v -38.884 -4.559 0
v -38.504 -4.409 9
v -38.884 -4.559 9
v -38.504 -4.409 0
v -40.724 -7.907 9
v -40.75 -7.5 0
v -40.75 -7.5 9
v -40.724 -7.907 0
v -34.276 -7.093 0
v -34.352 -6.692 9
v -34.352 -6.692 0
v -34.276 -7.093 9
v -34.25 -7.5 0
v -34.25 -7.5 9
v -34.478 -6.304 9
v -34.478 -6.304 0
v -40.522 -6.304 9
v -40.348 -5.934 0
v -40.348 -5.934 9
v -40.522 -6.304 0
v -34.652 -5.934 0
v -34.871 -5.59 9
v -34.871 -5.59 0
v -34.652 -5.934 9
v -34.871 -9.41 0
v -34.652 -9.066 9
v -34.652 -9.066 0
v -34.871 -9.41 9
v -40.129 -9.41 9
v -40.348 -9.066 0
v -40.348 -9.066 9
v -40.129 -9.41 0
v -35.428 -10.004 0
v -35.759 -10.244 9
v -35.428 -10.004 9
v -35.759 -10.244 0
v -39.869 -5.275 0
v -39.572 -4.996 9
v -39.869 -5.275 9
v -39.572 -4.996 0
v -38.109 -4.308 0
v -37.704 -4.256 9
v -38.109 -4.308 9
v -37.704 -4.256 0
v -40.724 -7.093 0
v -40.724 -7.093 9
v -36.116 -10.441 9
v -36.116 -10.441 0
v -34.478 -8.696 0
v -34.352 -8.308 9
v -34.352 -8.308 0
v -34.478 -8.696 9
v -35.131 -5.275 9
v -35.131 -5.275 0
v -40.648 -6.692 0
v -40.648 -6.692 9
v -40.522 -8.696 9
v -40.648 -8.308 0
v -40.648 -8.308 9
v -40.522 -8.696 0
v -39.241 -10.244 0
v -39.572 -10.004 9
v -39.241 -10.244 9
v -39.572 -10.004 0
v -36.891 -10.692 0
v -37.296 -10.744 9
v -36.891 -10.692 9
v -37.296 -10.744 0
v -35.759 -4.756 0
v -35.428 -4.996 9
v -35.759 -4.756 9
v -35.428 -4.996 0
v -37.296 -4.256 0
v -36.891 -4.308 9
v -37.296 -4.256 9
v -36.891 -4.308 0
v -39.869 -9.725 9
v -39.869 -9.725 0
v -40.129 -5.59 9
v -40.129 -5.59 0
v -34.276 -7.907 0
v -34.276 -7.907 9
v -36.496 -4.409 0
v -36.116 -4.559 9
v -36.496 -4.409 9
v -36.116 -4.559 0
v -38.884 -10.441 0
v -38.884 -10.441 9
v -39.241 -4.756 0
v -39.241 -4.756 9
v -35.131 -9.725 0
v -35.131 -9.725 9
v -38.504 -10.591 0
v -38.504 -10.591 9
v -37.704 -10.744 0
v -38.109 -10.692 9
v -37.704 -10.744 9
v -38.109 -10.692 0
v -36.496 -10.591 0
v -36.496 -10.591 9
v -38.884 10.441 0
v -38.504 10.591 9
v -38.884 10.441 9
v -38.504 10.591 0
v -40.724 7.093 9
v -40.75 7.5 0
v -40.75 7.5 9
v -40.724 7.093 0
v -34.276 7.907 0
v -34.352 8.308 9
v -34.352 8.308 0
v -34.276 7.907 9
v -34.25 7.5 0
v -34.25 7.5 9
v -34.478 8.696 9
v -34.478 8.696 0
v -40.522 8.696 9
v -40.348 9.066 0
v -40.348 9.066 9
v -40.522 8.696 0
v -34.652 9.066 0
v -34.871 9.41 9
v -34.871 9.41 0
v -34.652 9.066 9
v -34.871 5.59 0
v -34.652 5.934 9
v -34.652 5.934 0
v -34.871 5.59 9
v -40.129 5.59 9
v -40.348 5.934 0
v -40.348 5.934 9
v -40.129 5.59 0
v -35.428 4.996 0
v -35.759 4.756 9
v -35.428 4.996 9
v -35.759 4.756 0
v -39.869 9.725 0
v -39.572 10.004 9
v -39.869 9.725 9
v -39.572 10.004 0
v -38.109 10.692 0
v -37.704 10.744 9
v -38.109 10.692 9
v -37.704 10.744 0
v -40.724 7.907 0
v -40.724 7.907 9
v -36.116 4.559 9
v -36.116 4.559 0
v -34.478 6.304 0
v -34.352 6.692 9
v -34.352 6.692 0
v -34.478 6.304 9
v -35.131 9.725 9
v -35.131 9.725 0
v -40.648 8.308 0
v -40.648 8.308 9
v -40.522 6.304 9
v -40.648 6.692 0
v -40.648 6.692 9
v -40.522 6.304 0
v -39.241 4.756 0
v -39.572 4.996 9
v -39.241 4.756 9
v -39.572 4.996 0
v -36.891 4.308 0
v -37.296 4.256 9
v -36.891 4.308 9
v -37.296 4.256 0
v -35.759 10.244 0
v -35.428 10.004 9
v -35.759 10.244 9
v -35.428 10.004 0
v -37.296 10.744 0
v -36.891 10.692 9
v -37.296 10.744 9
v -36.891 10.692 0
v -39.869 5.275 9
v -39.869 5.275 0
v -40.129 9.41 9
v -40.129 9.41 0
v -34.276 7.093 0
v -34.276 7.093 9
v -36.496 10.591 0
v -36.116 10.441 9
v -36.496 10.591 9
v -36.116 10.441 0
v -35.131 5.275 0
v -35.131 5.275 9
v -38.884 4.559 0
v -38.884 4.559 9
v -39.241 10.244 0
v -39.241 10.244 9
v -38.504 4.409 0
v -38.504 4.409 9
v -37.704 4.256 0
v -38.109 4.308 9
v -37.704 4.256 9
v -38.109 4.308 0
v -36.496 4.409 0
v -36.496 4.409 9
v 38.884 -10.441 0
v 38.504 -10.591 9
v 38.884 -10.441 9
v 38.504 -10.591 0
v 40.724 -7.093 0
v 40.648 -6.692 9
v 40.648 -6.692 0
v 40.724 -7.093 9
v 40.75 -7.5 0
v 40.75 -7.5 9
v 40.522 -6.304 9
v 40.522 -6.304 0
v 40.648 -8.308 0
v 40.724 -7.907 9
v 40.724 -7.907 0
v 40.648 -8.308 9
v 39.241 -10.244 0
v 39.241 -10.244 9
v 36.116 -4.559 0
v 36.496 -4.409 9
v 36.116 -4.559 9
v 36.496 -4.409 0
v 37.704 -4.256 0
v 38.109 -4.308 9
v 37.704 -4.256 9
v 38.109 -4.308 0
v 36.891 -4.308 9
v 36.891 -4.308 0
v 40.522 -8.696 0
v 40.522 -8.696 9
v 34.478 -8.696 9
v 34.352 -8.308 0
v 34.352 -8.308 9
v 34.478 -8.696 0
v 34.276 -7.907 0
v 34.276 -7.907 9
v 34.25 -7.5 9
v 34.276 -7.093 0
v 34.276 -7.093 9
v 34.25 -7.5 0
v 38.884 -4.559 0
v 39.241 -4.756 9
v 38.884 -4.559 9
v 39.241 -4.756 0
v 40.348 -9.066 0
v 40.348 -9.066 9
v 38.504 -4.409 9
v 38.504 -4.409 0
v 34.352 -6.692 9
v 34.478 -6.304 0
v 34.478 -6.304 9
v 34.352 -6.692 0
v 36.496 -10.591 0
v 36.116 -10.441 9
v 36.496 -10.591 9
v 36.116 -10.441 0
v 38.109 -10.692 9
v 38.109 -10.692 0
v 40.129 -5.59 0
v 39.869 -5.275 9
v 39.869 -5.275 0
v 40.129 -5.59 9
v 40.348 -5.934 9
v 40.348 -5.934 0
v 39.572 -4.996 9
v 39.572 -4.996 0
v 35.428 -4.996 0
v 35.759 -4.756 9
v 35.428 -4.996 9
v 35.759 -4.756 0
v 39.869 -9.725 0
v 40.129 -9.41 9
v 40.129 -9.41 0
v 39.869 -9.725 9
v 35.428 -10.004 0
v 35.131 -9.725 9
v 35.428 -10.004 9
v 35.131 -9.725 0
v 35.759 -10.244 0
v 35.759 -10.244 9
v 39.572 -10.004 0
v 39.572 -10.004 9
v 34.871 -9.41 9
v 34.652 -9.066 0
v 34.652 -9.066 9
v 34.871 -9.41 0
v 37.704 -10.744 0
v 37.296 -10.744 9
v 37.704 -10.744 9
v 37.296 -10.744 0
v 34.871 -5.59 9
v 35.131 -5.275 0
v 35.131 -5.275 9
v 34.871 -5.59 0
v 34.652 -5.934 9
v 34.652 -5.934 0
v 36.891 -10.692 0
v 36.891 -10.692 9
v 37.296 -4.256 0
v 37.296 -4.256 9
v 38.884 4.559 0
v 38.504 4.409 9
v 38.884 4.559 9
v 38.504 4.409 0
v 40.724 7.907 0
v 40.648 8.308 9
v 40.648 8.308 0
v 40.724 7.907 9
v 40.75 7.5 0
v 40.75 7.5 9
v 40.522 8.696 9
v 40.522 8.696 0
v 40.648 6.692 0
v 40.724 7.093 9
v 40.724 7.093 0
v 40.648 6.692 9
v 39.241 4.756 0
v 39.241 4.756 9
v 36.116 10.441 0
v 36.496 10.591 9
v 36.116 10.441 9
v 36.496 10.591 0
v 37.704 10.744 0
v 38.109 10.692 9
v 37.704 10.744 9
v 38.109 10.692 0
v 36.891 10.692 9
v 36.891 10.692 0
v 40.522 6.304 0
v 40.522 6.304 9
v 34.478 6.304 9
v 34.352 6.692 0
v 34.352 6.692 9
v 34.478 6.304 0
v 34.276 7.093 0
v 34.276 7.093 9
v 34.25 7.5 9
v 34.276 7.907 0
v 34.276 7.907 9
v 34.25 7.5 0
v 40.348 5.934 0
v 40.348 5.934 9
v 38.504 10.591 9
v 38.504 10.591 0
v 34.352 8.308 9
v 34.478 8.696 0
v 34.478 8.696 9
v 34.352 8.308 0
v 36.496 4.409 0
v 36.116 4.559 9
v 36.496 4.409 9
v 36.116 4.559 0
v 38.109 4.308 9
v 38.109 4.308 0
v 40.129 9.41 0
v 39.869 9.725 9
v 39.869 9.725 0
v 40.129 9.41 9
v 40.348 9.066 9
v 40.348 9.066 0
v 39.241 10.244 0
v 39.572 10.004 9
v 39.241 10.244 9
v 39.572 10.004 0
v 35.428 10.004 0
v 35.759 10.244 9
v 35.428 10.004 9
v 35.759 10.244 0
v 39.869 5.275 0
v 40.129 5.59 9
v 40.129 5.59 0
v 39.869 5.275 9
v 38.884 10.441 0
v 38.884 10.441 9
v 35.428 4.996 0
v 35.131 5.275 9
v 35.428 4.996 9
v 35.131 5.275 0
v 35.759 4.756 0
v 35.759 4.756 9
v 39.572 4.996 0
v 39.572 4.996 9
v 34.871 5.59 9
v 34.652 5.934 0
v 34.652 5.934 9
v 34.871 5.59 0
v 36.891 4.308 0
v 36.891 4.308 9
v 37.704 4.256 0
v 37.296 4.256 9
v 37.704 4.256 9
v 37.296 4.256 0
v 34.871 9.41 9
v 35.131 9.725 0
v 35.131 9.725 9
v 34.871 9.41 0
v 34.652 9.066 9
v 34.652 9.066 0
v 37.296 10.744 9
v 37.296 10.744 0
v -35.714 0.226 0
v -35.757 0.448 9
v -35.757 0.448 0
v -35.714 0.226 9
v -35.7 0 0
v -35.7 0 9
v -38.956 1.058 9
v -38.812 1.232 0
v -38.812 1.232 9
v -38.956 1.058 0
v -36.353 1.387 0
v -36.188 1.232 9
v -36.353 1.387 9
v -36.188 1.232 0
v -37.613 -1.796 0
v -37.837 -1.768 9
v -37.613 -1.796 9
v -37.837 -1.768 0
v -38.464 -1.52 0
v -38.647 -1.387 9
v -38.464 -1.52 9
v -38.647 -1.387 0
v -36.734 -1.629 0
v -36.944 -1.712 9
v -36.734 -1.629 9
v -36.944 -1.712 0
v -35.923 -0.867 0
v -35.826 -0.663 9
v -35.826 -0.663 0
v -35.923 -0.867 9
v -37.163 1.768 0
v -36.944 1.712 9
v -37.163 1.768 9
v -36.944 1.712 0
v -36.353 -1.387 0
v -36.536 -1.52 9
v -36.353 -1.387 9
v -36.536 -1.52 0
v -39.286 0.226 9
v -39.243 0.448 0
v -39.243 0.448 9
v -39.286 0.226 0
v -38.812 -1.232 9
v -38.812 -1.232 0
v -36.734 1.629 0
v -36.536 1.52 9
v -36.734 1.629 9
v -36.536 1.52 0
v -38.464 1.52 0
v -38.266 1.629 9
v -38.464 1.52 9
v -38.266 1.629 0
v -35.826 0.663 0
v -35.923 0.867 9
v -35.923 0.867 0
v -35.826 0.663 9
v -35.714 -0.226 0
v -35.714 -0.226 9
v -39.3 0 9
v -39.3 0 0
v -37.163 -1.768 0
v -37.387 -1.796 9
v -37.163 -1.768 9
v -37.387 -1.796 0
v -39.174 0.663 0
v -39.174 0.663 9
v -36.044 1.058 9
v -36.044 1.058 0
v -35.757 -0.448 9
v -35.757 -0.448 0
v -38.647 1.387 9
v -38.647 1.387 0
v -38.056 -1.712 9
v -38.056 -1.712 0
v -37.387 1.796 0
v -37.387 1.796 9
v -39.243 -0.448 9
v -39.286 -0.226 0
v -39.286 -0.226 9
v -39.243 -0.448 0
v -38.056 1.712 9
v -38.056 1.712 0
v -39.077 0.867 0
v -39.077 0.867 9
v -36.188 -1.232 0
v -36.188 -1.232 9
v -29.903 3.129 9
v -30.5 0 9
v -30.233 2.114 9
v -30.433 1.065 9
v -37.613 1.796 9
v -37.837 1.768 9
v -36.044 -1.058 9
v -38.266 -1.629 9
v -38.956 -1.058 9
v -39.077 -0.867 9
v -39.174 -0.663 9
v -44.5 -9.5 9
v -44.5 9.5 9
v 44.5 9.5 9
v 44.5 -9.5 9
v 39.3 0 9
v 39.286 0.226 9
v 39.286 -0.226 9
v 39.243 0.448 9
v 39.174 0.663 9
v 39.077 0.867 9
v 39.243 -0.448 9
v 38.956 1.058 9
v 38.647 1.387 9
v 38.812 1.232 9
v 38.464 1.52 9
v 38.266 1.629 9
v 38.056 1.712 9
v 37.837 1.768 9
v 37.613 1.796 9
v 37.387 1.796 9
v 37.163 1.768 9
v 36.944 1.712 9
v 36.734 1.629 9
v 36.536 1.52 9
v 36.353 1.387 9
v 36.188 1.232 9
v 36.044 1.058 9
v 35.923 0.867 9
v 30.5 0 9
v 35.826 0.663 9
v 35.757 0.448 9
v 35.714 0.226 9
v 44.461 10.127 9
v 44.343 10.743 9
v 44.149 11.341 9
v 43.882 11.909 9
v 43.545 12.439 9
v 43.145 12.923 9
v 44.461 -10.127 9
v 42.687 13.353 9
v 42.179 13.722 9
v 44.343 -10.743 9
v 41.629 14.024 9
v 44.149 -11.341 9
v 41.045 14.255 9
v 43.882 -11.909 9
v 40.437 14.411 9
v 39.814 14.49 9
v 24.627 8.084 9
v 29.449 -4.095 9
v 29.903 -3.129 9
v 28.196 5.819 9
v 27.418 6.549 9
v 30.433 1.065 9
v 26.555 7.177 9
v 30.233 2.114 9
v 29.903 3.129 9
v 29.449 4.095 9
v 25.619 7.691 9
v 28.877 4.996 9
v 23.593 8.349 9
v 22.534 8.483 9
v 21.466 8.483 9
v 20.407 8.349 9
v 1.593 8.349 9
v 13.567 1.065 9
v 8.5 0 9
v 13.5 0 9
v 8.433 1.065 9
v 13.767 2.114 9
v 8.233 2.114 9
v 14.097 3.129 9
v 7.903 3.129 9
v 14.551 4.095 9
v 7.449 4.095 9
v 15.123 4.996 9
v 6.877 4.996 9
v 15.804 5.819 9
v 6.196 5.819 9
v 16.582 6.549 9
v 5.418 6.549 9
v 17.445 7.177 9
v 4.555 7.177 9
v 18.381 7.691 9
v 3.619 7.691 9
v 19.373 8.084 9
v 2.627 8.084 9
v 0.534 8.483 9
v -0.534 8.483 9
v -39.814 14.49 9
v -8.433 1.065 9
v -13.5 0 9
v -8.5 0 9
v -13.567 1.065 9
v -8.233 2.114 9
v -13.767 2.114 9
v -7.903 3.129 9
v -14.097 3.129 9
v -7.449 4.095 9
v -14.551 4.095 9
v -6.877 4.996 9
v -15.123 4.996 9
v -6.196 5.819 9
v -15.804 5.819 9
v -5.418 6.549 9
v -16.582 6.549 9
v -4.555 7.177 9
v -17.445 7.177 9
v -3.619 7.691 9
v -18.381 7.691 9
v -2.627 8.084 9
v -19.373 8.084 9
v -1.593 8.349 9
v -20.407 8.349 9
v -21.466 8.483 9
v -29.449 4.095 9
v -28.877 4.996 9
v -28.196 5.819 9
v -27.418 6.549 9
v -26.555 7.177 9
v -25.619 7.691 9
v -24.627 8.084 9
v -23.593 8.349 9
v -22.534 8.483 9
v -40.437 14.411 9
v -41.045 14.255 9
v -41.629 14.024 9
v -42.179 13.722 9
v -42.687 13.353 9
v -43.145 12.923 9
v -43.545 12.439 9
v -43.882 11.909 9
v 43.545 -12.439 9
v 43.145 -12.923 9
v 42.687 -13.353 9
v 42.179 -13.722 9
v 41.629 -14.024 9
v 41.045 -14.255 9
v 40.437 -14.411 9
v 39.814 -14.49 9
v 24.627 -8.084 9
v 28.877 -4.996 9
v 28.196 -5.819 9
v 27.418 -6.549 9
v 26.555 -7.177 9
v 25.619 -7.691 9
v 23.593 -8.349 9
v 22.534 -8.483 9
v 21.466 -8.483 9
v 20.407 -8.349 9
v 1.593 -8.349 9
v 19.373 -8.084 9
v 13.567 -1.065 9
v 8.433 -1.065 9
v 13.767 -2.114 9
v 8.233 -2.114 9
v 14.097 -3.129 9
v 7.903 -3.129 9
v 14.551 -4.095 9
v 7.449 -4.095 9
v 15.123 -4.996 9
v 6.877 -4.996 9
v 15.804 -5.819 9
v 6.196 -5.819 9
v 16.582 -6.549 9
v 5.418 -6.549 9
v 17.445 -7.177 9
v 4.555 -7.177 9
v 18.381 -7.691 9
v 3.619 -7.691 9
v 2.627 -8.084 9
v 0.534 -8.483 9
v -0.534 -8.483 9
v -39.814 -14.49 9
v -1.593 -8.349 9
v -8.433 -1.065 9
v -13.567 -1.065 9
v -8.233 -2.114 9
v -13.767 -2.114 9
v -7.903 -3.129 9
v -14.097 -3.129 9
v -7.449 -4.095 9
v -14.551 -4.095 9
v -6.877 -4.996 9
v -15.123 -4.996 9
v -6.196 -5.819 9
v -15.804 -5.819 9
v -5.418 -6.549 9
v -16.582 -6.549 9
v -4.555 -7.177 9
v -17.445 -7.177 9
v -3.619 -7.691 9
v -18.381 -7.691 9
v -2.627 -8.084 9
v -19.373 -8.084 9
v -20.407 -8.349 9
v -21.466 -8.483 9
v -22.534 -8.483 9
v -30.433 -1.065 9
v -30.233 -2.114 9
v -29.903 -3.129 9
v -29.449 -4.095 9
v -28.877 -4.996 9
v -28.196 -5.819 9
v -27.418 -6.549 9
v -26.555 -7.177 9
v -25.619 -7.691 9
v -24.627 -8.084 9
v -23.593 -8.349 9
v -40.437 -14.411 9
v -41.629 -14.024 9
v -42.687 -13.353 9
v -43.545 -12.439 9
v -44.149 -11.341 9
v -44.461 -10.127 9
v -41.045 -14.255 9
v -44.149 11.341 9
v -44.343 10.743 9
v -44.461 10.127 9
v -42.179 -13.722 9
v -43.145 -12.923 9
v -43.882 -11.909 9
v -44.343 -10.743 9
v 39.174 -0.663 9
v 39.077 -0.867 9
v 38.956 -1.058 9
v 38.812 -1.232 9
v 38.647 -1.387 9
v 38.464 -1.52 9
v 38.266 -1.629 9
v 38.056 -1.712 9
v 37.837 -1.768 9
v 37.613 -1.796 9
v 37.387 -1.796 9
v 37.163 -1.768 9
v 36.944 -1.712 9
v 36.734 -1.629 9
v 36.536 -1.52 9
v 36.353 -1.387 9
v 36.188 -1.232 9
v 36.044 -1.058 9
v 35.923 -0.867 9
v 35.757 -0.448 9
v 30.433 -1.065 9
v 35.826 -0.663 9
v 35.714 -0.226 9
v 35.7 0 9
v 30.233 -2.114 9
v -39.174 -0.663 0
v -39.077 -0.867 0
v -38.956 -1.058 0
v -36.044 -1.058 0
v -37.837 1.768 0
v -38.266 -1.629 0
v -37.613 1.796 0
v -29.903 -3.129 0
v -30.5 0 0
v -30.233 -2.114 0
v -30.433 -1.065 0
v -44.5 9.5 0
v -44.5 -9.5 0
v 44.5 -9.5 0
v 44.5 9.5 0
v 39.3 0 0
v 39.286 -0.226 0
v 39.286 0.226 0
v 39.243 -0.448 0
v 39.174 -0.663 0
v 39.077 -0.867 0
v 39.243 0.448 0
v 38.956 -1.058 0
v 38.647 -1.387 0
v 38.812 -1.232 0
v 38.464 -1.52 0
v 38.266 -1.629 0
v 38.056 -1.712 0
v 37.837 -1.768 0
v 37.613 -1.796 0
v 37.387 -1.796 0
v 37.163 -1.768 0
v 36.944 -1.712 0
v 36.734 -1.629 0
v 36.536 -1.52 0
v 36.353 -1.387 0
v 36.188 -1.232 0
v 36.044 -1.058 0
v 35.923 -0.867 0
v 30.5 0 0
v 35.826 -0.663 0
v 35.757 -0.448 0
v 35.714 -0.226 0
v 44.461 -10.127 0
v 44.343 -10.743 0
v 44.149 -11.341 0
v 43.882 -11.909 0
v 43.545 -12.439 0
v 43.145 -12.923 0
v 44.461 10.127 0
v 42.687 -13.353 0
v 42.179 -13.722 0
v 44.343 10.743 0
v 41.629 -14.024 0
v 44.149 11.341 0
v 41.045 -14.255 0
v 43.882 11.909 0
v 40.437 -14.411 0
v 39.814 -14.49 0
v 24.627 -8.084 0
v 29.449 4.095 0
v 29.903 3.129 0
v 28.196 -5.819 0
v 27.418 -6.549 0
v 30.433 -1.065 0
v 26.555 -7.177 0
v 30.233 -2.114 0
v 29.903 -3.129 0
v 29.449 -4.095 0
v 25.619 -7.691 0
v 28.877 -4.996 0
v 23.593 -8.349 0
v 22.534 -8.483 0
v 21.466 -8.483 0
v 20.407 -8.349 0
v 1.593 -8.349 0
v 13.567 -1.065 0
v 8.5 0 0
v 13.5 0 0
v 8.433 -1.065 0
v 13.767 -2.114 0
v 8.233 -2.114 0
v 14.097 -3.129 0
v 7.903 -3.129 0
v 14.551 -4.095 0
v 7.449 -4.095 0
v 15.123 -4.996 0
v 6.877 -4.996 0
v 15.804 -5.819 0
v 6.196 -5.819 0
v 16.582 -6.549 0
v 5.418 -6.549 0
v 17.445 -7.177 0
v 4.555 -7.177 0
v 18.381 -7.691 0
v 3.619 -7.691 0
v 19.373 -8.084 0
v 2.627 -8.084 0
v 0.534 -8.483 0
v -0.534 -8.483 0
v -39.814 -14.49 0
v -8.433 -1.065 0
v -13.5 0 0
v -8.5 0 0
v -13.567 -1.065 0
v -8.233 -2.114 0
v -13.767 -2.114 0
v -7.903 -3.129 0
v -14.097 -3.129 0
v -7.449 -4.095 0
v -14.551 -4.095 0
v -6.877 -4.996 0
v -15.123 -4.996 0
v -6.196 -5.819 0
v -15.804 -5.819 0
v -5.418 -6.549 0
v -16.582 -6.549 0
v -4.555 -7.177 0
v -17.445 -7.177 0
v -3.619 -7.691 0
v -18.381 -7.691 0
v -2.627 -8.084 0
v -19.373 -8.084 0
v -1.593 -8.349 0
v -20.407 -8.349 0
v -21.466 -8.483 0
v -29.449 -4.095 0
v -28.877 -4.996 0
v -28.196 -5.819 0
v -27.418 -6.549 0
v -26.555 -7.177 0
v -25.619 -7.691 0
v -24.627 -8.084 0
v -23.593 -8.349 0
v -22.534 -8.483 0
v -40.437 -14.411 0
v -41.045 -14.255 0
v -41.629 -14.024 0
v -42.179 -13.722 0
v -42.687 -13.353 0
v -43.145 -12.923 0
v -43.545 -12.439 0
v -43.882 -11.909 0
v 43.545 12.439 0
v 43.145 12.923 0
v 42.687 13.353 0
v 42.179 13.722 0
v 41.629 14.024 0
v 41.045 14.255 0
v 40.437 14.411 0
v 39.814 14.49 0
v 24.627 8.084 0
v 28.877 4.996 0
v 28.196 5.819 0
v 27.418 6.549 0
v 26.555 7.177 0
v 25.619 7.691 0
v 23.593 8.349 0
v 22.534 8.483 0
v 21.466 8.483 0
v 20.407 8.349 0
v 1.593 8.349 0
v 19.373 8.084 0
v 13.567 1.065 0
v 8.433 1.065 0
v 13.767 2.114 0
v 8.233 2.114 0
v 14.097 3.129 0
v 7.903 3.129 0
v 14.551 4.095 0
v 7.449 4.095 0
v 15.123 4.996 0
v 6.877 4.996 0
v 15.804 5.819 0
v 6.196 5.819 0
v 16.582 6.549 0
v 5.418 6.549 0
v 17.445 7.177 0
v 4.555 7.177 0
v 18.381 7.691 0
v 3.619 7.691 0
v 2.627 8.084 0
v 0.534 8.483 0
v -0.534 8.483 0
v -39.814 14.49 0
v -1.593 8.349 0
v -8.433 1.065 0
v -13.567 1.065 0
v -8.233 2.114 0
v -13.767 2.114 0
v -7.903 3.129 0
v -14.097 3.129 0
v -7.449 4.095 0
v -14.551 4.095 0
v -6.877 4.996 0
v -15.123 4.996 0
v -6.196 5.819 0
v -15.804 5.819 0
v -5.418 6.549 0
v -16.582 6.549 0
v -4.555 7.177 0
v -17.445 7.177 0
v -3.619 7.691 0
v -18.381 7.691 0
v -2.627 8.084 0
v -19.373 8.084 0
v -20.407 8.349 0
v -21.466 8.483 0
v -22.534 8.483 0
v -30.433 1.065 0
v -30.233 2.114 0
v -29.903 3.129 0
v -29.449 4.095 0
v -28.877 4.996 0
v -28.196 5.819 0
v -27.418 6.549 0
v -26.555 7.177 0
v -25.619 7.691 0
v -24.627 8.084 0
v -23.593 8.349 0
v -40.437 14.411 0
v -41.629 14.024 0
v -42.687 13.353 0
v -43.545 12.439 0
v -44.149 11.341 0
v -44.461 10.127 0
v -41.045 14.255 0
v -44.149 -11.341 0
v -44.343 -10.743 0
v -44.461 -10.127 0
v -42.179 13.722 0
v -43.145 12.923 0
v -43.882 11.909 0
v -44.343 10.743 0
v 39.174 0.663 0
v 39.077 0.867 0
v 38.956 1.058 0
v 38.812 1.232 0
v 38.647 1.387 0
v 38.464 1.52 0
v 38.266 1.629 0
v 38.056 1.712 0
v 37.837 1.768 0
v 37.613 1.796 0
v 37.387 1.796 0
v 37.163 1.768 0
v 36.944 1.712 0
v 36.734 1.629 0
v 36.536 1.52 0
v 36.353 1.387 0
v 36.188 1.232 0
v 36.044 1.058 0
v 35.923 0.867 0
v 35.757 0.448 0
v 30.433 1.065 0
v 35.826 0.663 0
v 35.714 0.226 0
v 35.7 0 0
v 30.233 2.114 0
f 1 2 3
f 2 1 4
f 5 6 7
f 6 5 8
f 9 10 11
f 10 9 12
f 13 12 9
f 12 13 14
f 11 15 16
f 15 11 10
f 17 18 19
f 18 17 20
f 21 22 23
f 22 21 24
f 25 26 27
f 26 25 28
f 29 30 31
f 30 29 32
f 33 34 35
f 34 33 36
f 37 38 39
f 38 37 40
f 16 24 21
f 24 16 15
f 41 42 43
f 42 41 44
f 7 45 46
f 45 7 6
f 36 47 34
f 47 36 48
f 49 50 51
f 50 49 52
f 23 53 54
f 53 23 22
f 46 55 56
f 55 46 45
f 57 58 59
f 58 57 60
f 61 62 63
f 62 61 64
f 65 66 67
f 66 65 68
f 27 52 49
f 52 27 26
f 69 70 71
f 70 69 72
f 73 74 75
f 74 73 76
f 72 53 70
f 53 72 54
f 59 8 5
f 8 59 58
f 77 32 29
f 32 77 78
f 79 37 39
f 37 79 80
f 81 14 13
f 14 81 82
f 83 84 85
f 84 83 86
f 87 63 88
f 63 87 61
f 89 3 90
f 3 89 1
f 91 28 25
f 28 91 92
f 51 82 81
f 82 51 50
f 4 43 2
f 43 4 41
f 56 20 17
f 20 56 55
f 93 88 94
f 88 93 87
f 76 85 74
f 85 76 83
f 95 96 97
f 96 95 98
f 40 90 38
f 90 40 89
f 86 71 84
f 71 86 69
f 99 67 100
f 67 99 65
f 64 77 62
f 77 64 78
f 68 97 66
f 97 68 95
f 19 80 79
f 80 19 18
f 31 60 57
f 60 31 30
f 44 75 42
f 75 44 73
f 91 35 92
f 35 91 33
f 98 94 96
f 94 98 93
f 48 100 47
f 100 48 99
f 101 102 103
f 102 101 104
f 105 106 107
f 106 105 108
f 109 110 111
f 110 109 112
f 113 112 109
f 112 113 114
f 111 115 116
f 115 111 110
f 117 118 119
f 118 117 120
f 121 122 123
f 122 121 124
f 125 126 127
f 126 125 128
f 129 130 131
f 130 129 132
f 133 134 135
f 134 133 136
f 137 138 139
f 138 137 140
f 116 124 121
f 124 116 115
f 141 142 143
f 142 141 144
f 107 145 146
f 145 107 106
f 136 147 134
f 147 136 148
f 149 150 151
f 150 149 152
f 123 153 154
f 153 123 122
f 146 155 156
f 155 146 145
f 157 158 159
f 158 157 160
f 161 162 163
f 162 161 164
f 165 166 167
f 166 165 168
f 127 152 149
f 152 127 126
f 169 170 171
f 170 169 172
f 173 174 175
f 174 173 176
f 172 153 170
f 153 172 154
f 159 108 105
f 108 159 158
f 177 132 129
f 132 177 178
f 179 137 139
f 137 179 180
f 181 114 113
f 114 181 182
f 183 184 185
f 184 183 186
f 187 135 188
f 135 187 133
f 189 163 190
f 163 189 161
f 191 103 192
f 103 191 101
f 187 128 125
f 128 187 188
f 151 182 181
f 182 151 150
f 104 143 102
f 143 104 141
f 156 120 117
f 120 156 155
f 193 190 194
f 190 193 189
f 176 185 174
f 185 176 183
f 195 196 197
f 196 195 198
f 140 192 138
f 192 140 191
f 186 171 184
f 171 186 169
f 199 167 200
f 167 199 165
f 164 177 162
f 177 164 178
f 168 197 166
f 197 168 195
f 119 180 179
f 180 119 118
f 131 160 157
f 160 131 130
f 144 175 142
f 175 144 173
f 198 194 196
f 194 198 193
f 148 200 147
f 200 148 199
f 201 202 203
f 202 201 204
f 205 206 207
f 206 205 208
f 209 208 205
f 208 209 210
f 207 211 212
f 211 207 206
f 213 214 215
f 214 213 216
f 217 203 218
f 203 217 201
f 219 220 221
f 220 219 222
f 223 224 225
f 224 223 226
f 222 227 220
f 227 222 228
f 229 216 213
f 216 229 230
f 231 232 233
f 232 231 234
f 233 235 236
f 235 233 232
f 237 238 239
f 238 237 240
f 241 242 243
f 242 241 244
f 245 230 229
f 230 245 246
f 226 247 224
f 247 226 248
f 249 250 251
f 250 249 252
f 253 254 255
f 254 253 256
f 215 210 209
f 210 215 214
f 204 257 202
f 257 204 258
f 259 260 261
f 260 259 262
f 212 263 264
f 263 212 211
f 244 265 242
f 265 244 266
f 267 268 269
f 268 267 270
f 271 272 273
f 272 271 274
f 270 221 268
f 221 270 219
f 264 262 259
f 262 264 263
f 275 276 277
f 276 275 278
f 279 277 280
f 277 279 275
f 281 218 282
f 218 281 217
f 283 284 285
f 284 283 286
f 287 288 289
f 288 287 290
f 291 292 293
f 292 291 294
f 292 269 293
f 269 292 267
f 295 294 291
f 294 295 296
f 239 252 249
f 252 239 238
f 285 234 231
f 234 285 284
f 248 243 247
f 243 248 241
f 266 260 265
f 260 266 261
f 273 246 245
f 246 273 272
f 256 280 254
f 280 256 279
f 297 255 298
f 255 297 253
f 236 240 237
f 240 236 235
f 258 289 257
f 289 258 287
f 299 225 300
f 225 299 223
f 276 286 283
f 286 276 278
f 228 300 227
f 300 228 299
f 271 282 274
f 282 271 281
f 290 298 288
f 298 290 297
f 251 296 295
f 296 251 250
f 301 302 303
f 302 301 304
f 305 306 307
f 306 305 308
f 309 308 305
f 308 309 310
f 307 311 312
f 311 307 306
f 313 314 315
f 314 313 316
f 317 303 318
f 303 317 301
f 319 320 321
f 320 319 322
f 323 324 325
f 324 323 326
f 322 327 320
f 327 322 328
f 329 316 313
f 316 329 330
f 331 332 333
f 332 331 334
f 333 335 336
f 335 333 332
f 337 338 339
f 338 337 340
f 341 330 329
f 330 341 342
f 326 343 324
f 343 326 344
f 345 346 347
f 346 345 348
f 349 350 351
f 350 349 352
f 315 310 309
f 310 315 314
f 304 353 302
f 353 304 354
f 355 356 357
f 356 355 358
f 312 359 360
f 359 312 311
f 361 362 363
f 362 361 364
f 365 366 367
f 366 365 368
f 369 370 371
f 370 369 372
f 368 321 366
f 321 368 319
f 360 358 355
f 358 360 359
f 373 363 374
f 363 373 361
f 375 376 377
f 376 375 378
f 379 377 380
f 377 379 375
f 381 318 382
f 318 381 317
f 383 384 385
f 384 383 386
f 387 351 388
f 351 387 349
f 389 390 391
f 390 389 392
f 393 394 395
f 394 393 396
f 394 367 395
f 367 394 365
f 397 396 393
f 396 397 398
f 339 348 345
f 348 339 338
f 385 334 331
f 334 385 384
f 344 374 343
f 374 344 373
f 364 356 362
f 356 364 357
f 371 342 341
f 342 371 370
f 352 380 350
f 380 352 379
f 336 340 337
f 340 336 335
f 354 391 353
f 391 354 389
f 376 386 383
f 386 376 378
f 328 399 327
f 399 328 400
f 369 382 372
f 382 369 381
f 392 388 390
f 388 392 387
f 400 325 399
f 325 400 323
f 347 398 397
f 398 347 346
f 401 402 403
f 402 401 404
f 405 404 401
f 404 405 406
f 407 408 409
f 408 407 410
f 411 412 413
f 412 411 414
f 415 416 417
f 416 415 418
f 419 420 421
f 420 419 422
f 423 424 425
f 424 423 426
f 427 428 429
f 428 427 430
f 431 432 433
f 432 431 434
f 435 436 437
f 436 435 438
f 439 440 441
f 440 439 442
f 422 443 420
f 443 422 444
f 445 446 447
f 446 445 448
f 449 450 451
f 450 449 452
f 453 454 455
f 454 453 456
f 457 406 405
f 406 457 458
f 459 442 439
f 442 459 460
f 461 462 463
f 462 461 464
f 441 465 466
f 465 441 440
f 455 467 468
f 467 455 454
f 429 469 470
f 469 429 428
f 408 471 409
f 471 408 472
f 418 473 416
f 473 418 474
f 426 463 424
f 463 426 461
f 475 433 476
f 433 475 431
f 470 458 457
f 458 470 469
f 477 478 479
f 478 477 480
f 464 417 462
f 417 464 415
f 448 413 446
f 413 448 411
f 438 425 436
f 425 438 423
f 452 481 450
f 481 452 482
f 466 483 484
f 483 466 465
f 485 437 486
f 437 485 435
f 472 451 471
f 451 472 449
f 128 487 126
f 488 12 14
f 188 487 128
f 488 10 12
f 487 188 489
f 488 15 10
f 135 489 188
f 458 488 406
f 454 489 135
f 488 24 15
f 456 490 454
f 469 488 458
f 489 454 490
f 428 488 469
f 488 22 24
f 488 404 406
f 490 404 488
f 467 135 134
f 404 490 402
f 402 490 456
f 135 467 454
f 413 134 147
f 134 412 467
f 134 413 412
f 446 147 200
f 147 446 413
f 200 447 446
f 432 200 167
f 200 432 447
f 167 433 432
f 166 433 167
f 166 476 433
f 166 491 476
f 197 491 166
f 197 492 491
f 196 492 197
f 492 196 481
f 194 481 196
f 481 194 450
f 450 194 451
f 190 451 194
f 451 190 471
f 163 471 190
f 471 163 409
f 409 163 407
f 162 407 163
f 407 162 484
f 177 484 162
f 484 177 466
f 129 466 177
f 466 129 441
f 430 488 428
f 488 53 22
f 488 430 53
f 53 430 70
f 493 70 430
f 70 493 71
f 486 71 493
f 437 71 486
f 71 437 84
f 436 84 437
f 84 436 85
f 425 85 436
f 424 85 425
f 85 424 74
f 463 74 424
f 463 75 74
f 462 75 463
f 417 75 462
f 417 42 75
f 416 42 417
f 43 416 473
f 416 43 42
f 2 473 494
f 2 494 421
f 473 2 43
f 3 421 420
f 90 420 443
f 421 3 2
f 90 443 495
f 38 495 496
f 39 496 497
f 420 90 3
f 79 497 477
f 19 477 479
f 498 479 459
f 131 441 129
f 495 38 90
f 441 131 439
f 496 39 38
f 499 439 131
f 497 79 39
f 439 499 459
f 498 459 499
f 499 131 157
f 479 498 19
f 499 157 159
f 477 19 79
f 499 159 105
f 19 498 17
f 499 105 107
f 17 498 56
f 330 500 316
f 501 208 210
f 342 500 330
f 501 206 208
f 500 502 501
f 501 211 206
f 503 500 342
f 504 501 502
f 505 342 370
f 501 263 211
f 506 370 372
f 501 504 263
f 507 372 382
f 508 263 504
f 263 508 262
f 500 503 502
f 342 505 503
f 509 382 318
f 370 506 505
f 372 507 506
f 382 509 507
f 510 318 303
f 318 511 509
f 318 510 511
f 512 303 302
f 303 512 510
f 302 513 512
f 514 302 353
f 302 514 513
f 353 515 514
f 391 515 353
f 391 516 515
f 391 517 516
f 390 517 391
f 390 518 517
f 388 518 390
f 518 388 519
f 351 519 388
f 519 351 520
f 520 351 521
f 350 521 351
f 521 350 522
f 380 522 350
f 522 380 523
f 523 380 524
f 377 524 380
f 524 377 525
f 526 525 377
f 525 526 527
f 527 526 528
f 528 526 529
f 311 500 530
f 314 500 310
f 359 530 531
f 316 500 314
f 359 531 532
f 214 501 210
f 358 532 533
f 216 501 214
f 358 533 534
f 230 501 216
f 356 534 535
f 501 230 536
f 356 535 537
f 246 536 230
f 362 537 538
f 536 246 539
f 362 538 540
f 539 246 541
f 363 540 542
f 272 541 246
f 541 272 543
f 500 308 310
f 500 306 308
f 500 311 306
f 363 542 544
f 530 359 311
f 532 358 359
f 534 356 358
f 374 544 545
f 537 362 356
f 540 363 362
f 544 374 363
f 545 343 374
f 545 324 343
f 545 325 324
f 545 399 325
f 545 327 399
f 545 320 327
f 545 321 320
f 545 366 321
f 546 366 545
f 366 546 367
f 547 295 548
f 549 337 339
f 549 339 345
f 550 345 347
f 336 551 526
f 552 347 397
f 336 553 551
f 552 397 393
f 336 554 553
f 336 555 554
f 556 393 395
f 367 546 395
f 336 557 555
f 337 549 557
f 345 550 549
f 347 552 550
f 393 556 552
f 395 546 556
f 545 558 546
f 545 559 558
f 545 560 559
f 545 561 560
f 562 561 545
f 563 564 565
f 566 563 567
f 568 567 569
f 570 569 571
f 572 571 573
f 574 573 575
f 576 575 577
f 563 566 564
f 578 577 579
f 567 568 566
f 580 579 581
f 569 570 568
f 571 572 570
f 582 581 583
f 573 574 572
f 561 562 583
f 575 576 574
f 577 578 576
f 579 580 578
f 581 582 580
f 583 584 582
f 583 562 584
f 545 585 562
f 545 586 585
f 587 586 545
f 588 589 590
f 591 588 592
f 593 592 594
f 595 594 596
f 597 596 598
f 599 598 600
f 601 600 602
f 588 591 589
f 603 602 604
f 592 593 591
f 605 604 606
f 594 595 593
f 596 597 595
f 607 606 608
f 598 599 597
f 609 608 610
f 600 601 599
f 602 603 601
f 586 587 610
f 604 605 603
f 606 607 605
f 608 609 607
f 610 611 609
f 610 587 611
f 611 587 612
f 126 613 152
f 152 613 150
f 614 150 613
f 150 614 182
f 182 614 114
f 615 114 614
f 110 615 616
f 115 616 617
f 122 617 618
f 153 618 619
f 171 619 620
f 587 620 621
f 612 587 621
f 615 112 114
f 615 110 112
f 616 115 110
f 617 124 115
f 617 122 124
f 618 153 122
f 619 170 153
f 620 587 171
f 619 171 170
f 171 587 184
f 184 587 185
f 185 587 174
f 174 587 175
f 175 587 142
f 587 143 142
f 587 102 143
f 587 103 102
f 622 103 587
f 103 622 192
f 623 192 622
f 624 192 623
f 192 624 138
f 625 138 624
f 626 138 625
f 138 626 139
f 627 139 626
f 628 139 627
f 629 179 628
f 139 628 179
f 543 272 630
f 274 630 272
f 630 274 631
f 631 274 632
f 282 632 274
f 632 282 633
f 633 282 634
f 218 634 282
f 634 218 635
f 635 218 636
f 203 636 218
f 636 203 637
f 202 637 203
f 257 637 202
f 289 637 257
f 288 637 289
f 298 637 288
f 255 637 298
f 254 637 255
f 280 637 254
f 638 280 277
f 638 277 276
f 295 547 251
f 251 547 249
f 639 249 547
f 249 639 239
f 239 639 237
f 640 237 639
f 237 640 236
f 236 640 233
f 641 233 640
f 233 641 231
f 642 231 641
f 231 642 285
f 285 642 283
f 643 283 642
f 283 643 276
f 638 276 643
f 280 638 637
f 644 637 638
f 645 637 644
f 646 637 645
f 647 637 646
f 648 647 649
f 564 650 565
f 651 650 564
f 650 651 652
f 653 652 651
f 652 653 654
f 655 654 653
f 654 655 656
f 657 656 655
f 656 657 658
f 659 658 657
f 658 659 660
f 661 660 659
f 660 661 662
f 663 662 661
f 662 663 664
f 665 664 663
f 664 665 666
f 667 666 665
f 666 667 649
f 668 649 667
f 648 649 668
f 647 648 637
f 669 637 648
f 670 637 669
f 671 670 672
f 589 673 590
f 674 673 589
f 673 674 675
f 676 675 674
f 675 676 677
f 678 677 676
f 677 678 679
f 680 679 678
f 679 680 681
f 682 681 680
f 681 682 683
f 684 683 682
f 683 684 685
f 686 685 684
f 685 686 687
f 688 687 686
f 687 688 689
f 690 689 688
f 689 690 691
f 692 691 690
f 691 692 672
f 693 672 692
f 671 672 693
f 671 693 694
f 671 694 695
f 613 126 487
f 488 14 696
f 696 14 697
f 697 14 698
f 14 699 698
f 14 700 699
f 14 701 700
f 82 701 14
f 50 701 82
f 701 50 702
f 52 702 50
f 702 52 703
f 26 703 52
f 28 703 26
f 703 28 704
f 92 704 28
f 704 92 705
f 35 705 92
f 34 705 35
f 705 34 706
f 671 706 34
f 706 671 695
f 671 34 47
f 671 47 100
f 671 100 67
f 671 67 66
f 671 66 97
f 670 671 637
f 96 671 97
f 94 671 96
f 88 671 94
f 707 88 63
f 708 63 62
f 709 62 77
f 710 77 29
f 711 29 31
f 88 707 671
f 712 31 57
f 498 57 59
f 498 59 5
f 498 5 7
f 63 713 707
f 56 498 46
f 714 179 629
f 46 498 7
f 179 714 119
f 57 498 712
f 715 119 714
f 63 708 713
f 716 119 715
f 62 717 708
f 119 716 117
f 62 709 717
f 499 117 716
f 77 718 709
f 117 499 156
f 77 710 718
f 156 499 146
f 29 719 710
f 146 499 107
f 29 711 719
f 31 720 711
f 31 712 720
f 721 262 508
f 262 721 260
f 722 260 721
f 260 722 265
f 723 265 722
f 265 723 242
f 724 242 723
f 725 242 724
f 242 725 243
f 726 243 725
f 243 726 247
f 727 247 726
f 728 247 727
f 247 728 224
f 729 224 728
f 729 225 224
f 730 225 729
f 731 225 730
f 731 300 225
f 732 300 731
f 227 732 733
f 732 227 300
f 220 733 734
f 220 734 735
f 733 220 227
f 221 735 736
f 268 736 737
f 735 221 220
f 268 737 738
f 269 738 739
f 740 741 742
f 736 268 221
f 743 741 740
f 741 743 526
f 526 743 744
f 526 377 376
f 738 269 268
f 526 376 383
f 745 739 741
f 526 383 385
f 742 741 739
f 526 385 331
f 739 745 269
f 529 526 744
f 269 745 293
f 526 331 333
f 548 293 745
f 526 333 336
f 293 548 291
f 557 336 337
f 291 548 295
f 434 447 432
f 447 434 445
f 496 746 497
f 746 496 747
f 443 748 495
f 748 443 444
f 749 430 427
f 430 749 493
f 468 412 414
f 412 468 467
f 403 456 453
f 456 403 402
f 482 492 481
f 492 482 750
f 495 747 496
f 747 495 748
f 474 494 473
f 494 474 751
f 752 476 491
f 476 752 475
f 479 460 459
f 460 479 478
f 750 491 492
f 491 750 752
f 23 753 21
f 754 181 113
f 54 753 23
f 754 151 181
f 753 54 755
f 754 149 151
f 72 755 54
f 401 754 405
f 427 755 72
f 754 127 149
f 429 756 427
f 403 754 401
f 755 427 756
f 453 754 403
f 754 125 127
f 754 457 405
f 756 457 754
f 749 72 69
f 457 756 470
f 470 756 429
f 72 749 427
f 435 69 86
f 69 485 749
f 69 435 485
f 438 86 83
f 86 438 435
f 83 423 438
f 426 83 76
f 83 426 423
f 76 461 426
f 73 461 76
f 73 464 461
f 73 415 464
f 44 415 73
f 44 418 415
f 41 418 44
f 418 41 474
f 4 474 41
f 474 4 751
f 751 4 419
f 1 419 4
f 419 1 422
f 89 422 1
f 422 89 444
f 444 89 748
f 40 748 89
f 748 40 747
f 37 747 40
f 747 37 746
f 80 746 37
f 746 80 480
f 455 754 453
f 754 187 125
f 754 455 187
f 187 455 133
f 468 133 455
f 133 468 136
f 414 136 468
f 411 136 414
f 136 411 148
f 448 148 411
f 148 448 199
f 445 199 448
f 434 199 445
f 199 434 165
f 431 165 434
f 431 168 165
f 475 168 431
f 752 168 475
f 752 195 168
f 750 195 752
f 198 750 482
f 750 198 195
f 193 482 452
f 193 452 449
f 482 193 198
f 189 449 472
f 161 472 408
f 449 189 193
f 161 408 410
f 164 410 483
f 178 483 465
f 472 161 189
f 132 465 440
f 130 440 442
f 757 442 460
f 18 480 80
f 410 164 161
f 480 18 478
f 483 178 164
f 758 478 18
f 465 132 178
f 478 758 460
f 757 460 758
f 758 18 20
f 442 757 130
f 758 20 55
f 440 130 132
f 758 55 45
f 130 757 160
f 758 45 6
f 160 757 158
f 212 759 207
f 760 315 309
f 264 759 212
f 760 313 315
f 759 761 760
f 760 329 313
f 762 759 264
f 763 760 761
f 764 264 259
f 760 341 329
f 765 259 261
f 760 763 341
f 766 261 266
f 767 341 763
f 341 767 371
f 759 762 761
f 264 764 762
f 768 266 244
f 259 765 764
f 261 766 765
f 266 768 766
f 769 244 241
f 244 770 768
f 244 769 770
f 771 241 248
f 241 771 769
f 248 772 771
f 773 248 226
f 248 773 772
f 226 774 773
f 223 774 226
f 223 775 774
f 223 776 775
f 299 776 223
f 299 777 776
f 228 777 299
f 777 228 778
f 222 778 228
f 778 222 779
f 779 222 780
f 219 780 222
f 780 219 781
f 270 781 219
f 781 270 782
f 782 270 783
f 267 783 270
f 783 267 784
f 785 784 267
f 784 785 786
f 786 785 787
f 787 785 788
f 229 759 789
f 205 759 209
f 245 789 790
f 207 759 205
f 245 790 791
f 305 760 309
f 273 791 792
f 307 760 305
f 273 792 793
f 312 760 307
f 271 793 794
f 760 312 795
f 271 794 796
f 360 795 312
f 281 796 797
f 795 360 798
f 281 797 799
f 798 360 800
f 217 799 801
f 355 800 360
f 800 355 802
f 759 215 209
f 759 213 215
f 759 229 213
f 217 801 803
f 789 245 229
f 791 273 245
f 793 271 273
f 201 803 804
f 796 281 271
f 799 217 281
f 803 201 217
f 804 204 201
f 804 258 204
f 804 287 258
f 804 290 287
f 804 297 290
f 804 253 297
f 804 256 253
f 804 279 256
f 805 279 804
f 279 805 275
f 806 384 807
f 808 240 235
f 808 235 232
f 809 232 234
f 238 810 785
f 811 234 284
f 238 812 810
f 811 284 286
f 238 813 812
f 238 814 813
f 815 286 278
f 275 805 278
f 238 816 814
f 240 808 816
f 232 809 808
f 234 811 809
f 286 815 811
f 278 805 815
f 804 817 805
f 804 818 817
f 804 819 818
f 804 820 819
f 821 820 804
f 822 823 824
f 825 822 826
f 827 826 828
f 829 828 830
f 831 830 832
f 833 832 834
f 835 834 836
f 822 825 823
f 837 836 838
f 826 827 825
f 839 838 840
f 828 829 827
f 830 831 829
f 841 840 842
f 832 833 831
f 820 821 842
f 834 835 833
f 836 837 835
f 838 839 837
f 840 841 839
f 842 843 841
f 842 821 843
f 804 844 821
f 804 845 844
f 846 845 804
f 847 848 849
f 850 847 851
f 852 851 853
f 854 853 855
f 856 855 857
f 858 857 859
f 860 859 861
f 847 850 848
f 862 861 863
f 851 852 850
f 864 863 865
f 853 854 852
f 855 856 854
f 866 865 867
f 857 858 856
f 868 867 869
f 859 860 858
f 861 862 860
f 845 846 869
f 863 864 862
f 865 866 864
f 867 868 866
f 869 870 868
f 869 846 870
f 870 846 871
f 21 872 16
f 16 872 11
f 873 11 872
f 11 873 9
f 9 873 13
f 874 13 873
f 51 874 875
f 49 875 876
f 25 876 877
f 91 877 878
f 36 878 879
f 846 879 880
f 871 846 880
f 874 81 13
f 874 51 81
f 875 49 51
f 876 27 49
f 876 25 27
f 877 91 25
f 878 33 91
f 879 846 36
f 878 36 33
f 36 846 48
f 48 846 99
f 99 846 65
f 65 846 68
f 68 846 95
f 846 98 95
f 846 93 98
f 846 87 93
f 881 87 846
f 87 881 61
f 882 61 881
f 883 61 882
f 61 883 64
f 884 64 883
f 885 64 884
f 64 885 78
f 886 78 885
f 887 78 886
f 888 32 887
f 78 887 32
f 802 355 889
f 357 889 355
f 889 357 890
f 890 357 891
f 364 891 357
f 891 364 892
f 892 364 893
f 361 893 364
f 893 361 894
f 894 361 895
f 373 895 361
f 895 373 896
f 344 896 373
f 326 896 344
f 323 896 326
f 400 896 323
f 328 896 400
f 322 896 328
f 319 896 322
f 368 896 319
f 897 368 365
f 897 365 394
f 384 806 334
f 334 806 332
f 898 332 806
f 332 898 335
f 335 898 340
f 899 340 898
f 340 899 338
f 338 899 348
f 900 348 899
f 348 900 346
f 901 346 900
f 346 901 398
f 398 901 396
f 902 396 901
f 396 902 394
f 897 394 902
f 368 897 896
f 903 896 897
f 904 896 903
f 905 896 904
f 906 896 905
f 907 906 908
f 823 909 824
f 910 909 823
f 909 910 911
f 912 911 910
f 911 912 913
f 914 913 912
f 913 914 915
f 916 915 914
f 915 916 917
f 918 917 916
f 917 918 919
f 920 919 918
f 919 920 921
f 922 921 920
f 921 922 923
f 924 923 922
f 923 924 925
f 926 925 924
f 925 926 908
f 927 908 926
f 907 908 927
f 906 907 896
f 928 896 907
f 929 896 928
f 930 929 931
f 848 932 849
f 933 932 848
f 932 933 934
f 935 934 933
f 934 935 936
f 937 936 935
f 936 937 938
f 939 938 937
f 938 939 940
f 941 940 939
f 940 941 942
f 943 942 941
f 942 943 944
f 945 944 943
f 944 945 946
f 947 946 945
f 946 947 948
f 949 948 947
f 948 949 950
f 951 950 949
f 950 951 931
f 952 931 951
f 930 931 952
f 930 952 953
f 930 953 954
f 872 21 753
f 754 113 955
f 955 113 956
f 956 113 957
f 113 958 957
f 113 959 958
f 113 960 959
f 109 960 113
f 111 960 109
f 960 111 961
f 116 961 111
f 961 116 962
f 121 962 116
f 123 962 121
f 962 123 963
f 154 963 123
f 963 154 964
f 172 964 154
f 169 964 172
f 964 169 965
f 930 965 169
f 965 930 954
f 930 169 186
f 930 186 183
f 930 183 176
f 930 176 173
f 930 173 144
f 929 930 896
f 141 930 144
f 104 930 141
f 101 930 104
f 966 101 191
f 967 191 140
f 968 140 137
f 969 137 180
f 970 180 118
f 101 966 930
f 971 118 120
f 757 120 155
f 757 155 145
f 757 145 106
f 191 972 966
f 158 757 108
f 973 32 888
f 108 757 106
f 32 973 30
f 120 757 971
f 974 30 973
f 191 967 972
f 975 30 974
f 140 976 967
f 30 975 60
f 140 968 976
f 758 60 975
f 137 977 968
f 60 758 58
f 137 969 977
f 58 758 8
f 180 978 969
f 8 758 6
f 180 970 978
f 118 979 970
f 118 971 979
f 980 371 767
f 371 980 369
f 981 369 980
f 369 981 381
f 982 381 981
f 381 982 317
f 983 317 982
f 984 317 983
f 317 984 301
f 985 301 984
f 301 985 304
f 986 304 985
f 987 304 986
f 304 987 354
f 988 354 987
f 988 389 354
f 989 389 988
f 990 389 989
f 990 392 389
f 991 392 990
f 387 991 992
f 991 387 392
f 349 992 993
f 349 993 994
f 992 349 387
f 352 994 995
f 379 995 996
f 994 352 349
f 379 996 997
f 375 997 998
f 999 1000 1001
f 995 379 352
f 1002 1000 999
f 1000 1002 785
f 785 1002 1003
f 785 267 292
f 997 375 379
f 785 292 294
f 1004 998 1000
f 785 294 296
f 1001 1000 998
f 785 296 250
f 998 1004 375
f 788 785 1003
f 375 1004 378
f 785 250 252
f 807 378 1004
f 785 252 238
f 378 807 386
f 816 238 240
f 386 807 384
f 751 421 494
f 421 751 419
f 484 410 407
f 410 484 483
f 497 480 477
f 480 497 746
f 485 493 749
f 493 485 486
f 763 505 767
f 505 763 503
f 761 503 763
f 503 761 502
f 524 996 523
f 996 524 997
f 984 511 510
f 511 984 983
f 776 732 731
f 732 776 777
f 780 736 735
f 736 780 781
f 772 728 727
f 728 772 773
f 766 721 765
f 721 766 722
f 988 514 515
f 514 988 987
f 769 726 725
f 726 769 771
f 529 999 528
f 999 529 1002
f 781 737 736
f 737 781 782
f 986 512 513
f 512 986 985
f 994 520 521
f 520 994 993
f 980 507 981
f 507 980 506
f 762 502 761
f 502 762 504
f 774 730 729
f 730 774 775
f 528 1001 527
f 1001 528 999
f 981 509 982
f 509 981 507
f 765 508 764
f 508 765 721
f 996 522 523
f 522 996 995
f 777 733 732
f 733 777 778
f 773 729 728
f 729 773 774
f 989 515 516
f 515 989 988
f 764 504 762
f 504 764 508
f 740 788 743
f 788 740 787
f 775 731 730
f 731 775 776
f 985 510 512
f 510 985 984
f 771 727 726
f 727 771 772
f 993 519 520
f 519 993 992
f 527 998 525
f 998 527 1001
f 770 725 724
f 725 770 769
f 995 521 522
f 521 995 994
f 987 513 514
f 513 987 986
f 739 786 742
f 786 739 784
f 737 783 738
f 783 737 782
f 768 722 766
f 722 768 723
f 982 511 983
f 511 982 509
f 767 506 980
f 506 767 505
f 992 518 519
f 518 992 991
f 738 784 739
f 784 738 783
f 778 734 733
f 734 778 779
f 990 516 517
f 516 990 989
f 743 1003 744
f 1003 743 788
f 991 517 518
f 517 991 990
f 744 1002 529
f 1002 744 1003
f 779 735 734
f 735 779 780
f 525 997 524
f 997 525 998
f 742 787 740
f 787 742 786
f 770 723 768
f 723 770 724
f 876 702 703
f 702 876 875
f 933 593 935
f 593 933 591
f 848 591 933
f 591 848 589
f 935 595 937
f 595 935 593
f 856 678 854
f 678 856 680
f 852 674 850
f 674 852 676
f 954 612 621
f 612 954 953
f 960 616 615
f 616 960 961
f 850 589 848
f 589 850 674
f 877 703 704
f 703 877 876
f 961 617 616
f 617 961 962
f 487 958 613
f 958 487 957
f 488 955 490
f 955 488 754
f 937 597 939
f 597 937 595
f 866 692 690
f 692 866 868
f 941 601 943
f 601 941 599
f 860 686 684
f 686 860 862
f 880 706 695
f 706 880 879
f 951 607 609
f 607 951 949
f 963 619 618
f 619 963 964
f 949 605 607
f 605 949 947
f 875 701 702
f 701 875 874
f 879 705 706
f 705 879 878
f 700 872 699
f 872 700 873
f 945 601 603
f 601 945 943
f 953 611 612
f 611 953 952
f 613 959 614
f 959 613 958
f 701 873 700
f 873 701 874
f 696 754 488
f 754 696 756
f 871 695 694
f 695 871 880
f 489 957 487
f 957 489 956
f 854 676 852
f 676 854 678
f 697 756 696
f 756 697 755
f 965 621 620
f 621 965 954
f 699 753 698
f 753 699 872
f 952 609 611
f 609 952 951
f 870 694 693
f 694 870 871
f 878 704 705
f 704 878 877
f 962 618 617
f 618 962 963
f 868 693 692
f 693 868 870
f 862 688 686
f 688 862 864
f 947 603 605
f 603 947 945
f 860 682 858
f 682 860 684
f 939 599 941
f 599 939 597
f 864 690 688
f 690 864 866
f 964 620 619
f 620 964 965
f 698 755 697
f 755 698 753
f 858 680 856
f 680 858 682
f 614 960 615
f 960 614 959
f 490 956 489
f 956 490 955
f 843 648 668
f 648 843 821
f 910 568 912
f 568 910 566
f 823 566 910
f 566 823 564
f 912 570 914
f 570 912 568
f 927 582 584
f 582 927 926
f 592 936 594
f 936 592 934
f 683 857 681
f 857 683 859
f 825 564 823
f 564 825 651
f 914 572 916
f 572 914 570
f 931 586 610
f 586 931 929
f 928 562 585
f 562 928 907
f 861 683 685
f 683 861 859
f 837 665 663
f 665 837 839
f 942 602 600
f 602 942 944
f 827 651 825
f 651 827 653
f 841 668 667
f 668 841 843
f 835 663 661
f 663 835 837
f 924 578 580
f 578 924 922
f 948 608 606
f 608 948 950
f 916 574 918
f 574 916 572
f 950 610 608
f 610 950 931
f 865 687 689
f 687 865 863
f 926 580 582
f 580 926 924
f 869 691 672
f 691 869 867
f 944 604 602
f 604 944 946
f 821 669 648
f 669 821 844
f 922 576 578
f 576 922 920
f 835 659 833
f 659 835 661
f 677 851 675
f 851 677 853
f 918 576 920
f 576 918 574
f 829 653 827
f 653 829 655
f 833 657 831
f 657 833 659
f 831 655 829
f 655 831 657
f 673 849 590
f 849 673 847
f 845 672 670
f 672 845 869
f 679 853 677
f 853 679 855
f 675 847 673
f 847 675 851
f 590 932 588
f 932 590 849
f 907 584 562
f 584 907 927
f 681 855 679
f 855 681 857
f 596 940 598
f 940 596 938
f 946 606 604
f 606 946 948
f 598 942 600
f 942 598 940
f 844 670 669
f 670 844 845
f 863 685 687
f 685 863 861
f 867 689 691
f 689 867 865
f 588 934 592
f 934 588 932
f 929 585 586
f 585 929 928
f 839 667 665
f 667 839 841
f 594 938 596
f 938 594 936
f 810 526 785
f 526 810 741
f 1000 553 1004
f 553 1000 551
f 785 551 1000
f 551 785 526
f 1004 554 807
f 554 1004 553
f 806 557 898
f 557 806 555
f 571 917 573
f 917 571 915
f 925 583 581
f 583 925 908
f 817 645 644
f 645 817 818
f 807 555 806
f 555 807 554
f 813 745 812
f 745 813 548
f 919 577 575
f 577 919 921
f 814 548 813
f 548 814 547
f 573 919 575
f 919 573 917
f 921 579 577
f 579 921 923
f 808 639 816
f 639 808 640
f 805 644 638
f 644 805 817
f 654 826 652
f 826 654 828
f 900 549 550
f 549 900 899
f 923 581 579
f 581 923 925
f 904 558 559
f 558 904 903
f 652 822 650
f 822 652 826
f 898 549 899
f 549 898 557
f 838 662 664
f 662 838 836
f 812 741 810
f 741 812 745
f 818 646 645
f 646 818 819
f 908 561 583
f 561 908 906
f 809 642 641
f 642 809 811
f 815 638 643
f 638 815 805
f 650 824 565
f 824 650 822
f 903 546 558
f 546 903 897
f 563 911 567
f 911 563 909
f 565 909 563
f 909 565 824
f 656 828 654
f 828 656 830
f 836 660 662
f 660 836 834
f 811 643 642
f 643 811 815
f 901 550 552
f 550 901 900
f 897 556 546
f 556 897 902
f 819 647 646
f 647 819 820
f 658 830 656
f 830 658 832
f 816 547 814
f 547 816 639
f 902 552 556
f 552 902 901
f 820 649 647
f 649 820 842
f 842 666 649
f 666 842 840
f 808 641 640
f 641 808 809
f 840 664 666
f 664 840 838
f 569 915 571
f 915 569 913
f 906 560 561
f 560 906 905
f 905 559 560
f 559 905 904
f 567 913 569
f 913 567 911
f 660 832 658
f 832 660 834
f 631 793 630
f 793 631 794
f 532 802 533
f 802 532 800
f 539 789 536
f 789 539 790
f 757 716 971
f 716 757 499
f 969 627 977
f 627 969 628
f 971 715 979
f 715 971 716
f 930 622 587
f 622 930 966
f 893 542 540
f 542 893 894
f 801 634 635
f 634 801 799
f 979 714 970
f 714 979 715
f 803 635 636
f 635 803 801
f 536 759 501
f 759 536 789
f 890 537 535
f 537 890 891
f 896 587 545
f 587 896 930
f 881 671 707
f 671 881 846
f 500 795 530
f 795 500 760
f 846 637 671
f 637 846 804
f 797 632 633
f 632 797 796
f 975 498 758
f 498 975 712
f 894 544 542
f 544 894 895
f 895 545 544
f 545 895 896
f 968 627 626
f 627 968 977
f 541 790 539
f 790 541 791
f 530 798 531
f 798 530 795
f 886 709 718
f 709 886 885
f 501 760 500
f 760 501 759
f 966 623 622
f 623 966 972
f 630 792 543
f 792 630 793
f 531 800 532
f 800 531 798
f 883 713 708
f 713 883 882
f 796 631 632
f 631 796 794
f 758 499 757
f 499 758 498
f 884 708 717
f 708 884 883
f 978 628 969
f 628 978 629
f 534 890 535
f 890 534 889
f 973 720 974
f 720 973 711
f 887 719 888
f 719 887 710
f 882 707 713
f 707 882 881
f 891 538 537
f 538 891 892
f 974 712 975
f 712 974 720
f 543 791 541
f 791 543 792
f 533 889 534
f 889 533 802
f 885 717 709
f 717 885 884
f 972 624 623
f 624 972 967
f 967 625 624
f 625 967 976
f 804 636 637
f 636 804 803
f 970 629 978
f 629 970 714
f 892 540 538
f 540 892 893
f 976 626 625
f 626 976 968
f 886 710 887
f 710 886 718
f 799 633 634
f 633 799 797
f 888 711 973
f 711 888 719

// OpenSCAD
$fn = 50;


difference() {
	union() {
		hull() {
			translate(v = [-39.5000000000, 9.5000000000, 0]) {
				cylinder(h = 9, r = 5);
			}
			translate(v = [39.5000000000, 9.5000000000, 0]) {
				cylinder(h = 9, r = 5);
			}
			translate(v = [-39.5000000000, -9.5000000000, 0]) {
				cylinder(h = 9, r = 5);
			}
			translate(v = [39.5000000000, -9.5000000000, 0]) {
				cylinder(h = 9, r = 5);
			}
		}
	}
	union() {
		#translate(v = [-37.5000000000, -7.5000000000, 0]) {
			cylinder(h = 9, r = 3.2500000000);
		}
		#translate(v = [-37.5000000000, 7.5000000000, 0]) {
			cylinder(h = 9, r = 3.2500000000);
		}
		#translate(v = [37.5000000000, -7.5000000000, 0]) {
			cylinder(h = 9, r = 3.2500000000);
		}
		#translate(v = [37.5000000000, 7.5000000000, 0]) {
			cylinder(h = 9, r = 3.2500000000);
		}
		#translate(v = [-37.5000000000, -7.5000000000, -100.0000000000]) {
			cylinder(h = 200, r = 3.2500000000);
		}
		#translate(v = [-37.5000000000, 7.5000000000, -100.0000000000]) {
			cylinder(h = 200, r = 3.2500000000);
		}
		#translate(v = [37.5000000000, -7.5000000000, -100.0000000000]) {
			cylinder(h = 200, r = 3.2500000000);
		}
		#translate(v = [37.5000000000, 7.5000000000, -100.0000000000]) {
			cylinder(h = 200, r = 3.2500000000);
		}
		#translate(v = [-37.5000000000, -7.5000000000, 0]) {
			cylinder(h = 9, r = 1.8000000000);
		}
		#translate(v = [-37.5000000000, 0.0000000000, 0]) {
			cylinder(h = 9, r = 1.8000000000);
		}
		#translate(v = [-37.5000000000, 7.5000000000, 0]) {
			cylinder(h = 9, r = 1.8000000000);
		}
		#translate(v = [37.5000000000, -7.5000000000, 0]) {
			cylinder(h = 9, r = 1.8000000000);
		}
		#translate(v = [37.5000000000, 0.0000000000, 0]) {
			cylinder(h = 9, r = 1.8000000000);
		}
		#translate(v = [37.5000000000, 7.5000000000, 0]) {
			cylinder(h = 9, r = 1.8000000000);
		}
		#translate(v = [-37.5000000000, -7.5000000000, 0]) {
			cylinder(h = 9, r = 1.8000000000);
		}
		#translate(v = [-37.5000000000, 0.0000000000, 0]) {
			cylinder(h = 9, r = 1.8000000000);
		}
		#translate(v = [-37.5000000000, 7.5000000000, 0]) {
			cylinder(h = 9, r = 1.8000000000);
		}
		#translate(v = [37.5000000000, -7.5000000000, 0]) {
			cylinder(h = 9, r = 1.8000000000);
		}
		#translate(v = [37.5000000000, 0.0000000000, 0]) {
			cylinder(h = 9, r = 1.8000000000);
		}
		#translate(v = [37.5000000000, 7.5000000000, 0]) {
			cylinder(h = 9, r = 1.8000000000);
		}
		#translate(v = [-37.5000000000, -7.5000000000, 0]) {
			cylinder(h = 9, r = 1.8000000000);
		}
		#translate(v = [-37.5000000000, 0.0000000000, 0]) {
			cylinder(h = 9, r = 1.8000000000);
		}
		#translate(v = [-37.5000000000, 7.5000000000, 0]) {
			cylinder(h = 9, r = 1.8000000000);
		}
		#translate(v = [37.5000000000, -7.5000000000, 0]) {
			cylinder(h = 9, r = 1.8000000000);
		}
		#translate(v = [37.5000000000, 0.0000000000, 0]) {
			cylinder(h = 9, r = 1.8000000000);
		}
		#translate(v = [37.5000000000, 7.5000000000, 0]) {
			cylinder(h = 9, r = 1.8000000000);
		}
		#translate(v = [-22.0000000000, 0, 0]) {
			cylinder(h = 9, r = 8.5000000000);
		}
		#cylinder(h = 9, r = 8.5000000000);
		#translate(v = [22.0000000000, 0, 0]) {
			cylinder(h = 9, r = 8.5000000000);
		}
	}
}
